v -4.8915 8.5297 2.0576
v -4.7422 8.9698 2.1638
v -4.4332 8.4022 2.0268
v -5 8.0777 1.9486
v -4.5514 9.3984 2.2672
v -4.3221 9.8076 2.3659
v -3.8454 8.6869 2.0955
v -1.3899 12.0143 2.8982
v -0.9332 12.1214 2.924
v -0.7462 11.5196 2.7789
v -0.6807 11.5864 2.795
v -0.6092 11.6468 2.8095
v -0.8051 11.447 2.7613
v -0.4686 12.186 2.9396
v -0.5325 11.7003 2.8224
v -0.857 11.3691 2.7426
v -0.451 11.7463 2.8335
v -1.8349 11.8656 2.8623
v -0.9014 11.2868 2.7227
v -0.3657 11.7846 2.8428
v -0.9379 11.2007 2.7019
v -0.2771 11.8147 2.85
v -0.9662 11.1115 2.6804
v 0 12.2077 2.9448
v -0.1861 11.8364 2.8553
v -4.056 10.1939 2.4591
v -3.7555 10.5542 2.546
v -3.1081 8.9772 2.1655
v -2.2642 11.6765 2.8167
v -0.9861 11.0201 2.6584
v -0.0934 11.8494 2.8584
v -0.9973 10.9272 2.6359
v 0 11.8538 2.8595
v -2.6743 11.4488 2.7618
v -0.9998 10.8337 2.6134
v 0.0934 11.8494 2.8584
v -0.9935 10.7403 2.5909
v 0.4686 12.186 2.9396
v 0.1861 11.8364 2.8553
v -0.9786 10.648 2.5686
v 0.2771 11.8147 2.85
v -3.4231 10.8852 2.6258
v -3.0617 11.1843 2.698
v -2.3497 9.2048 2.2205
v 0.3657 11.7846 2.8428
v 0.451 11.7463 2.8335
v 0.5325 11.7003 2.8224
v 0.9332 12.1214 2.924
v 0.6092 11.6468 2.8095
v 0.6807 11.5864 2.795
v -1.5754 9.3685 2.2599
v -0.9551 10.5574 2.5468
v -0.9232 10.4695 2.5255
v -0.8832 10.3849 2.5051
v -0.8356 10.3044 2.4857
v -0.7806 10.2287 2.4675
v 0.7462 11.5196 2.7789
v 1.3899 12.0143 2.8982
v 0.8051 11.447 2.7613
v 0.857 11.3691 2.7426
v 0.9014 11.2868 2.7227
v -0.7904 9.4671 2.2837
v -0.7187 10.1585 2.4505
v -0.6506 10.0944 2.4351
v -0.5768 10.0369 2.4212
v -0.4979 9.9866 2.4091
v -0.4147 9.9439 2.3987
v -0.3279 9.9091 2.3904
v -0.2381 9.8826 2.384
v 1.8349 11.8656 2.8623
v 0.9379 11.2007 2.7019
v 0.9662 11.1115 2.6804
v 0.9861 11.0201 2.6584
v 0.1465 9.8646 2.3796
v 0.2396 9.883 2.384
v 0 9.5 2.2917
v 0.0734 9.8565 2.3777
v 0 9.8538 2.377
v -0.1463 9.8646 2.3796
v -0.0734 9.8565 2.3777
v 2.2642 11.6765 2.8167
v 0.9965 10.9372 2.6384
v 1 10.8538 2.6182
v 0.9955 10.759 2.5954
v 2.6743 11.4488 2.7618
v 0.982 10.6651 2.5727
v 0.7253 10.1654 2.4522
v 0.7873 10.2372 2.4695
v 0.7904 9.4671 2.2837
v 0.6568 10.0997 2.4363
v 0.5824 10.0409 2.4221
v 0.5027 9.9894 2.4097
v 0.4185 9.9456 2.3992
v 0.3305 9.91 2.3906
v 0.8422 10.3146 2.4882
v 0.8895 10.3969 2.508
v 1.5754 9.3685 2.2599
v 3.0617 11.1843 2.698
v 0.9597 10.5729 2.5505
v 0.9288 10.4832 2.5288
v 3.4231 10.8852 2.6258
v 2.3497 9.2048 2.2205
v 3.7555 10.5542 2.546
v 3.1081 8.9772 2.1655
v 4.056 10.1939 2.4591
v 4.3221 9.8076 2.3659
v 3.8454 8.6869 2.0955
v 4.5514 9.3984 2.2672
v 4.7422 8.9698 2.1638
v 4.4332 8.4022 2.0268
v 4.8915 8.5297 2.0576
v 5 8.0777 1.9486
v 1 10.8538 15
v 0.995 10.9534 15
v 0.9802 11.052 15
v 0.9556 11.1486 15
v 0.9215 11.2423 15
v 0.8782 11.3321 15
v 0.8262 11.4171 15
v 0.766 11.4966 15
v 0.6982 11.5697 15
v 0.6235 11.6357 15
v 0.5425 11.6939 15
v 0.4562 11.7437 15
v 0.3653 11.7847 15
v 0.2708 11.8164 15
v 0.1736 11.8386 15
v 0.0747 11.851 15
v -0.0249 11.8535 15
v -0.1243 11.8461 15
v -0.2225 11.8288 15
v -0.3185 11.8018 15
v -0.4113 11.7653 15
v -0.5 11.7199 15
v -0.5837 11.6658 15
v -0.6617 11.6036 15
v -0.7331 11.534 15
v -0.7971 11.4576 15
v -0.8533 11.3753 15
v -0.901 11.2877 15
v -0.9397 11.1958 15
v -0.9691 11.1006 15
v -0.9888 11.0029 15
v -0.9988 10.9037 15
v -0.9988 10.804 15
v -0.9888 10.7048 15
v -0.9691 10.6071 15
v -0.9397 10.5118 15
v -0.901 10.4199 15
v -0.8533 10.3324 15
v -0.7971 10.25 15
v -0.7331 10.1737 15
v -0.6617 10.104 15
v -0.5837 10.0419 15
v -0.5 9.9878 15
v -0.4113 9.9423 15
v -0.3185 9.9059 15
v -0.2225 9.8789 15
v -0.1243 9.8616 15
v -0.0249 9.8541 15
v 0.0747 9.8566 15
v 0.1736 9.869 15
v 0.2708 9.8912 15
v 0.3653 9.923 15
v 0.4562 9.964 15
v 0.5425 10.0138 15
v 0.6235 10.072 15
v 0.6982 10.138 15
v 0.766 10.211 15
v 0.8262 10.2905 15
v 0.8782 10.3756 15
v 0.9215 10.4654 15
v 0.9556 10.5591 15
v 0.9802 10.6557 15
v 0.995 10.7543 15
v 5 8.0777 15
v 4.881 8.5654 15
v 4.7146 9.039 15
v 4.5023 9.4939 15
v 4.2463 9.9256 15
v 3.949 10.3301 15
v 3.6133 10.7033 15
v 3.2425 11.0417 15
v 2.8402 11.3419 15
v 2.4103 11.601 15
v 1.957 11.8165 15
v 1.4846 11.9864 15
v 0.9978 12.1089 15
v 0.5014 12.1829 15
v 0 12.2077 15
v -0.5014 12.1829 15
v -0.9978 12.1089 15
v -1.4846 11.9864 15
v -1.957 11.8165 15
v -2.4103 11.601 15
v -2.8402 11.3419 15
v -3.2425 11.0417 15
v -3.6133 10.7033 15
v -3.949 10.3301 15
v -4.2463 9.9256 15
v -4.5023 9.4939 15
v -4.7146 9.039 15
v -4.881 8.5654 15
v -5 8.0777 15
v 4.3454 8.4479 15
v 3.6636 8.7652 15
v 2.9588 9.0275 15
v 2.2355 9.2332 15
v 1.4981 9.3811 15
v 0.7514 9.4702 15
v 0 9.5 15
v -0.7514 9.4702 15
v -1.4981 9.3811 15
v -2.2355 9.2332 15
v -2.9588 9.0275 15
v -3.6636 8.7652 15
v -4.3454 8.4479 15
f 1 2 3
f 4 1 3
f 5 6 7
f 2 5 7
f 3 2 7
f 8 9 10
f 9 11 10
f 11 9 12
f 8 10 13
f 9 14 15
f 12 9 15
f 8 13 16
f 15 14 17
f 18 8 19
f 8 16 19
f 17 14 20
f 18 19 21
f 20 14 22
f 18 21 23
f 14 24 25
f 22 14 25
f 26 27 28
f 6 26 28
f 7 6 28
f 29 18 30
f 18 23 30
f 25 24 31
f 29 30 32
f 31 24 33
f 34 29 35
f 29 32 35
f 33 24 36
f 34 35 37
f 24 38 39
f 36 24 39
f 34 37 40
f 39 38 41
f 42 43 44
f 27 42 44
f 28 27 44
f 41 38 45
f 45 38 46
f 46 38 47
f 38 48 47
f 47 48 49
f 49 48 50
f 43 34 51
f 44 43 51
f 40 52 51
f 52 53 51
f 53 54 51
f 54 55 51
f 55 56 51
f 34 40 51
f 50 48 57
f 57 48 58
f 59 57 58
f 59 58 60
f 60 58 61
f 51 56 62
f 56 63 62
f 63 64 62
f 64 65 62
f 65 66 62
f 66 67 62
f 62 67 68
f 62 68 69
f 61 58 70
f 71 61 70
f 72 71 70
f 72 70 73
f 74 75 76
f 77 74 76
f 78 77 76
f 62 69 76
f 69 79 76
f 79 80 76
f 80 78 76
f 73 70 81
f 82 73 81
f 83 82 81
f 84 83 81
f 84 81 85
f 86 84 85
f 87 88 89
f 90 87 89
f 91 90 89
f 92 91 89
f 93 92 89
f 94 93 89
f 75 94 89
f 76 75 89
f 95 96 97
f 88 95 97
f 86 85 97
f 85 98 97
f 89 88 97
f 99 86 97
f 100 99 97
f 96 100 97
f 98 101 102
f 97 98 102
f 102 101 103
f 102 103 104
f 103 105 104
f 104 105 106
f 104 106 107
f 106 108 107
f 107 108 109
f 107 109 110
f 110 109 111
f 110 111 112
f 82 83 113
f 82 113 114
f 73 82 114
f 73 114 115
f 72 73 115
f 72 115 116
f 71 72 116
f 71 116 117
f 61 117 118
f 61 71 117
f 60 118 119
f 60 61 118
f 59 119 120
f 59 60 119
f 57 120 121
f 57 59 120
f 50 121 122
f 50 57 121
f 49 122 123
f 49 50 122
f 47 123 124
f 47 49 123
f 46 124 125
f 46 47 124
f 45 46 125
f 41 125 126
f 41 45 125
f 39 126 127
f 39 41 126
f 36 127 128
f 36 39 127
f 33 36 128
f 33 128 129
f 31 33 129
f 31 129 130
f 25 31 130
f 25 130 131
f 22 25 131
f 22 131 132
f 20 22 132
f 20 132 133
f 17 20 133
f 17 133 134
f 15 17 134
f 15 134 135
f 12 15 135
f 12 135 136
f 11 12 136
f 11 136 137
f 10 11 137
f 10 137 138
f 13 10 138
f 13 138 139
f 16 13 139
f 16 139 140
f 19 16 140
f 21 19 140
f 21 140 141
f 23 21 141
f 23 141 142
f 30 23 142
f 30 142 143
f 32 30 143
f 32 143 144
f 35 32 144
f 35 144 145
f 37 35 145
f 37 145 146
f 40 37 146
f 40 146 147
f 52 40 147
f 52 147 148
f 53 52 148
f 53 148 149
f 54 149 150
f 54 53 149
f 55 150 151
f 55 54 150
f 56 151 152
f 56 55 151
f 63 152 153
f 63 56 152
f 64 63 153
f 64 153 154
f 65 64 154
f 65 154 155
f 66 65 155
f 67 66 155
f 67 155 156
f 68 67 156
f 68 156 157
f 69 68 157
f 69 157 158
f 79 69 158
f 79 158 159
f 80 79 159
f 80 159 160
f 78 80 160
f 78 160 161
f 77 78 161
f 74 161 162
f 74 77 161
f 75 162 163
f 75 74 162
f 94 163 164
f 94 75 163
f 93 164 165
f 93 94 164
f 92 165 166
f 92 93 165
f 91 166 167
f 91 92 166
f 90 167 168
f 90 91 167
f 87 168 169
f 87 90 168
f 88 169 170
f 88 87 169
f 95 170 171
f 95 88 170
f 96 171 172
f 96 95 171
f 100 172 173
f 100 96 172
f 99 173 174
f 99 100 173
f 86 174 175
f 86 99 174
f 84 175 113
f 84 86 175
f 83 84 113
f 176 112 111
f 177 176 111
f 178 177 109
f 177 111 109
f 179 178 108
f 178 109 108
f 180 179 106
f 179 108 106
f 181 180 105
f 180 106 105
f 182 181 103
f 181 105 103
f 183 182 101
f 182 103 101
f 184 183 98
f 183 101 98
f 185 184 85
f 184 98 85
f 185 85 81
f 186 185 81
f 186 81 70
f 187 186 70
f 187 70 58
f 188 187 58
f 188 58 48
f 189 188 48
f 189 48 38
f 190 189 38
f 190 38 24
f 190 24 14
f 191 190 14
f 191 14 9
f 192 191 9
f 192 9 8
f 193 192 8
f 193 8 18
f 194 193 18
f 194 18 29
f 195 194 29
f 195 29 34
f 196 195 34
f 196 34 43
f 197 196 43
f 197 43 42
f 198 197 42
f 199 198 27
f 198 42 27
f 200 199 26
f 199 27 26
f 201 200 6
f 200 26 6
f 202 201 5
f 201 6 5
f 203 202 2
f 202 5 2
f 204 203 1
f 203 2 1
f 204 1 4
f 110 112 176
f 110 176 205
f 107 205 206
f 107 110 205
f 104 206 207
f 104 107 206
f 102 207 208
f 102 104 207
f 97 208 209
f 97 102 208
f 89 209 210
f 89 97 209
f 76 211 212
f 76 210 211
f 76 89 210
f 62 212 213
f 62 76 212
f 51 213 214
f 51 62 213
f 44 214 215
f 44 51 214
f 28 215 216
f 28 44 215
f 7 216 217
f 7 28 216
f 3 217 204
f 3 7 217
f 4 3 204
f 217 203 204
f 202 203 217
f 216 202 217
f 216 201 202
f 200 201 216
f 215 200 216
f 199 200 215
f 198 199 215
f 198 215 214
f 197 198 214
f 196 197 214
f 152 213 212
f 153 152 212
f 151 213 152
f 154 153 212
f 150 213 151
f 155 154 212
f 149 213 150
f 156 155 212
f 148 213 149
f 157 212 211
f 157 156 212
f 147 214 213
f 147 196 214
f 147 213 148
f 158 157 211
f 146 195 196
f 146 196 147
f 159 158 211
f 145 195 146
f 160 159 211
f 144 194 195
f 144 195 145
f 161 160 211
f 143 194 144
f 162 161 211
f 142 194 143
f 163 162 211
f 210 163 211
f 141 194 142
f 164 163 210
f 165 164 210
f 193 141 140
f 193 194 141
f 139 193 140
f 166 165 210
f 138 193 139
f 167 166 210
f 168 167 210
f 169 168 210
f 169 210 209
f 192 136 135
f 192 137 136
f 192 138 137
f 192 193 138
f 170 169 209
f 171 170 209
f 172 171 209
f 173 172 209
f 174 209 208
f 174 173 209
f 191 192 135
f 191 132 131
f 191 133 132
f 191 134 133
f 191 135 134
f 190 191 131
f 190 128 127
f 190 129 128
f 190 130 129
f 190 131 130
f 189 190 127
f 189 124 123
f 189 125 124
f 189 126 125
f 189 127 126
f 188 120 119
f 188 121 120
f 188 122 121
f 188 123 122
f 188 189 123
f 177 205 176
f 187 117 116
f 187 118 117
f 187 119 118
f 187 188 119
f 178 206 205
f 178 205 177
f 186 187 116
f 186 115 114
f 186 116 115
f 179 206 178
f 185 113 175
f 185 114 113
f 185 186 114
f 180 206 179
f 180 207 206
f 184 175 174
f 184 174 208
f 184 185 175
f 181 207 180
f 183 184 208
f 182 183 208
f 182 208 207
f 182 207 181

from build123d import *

# Parameters (mm, degrees)
F0_R          = 1
F2_DEPTH      = 15
F3_DEPTH      = 15.001
F5_DEPTH      = 5.001
F5_DEPTH_BACK = 5.001


with BuildPart() as f2:
    # F0 (on Top) → F2 (new body)
    with BuildSketch(Plane.XY):
        with BuildLine():
            ThreePointArc((-5, 8.0777472107), (-4.6233105022, -8.2990963363), (9.5, 0))
            ThreePointArc((9.5, 0), (8.2990963363, 4.6233105022), (5, 8.0777472107))
            ThreePointArc((5, 8.0777472107), (0, 9.5), (-5, 8.0777472107))
        make_face()
        with BuildLine():
            ThreePointArc((-5, 8.0777472107), (0, 9.5), (5, 8.0777472107))
            ThreePointArc((5, 8.0777472107), (0, 12.2076506099), (-5, 8.0777472107))
        make_face()
        with Locations((0, 10.8538253049)):
            Circle(F0_R, mode=Mode.SUBTRACT)
    extrude(amount=F2_DEPTH)

    # F1 (on Top) → F3 (cut, through all)
    with BuildSketch(Plane.XY):
        with BuildLine():
            Line((-5, 0), (0, 0))
            Line((0, 0), (5, 0))
            Line((5, 0), (5, 8.0777472107))
            ThreePointArc((5, 8.0777472107), (0, 9.5), (-5, 8.0777472107))
            Line((-5, 8.0777472107), (-5, 0))
        make_face()
        with BuildLine():
            Line((5, 0), (0, 0))
            Line((0, 0), (-5, 0))
            Line((-5, 0), (-5, 8.0777472107))
            ThreePointArc((-5, 8.0777472107), (-4.6233105022, -8.2990963363), (9.5, 0))
            ThreePointArc((9.5, 0), (8.2990963363, 4.6233105022), (5, 8.0777472107))
            Line((5, 8.0777472107), (5, 0))
        make_face()
        with BuildLine():
            Line((5, 20), (5, 8.0777472107))
            ThreePointArc((5, 8.0777472107), (8.2990963363, 4.6233105022), (9.5, 0))
            ThreePointArc((9.5, 0), (-4.6233105022, -8.2990963363), (-5, 8.0777472107))
            Line((-5, 8.0777472107), (-5, 20))
            Line((-5, 20), (-15, 20))
            Line((-15, 20), (-15, -15))
            Line((-15, -15), (15, -15))
            Line((15, -15), (15, 20))
            Line((15, 20), (5, 20))
        make_face()
    extrude(amount=F3_DEPTH, mode=Mode.SUBTRACT)

    # F4 (on Right) → F5 (cut, two sides)
    with BuildSketch(Plane.YZ) as f5_sk:
        Polygon((17.0873440802, 4.1219498962), (0, 0), (17.0873440802, 0), align=None)
    extrude(amount=F5_DEPTH, mode=Mode.SUBTRACT)
    extrude(f5_sk.sketch, amount=-F5_DEPTH_BACK, mode=Mode.SUBTRACT)


solid = f2.part
